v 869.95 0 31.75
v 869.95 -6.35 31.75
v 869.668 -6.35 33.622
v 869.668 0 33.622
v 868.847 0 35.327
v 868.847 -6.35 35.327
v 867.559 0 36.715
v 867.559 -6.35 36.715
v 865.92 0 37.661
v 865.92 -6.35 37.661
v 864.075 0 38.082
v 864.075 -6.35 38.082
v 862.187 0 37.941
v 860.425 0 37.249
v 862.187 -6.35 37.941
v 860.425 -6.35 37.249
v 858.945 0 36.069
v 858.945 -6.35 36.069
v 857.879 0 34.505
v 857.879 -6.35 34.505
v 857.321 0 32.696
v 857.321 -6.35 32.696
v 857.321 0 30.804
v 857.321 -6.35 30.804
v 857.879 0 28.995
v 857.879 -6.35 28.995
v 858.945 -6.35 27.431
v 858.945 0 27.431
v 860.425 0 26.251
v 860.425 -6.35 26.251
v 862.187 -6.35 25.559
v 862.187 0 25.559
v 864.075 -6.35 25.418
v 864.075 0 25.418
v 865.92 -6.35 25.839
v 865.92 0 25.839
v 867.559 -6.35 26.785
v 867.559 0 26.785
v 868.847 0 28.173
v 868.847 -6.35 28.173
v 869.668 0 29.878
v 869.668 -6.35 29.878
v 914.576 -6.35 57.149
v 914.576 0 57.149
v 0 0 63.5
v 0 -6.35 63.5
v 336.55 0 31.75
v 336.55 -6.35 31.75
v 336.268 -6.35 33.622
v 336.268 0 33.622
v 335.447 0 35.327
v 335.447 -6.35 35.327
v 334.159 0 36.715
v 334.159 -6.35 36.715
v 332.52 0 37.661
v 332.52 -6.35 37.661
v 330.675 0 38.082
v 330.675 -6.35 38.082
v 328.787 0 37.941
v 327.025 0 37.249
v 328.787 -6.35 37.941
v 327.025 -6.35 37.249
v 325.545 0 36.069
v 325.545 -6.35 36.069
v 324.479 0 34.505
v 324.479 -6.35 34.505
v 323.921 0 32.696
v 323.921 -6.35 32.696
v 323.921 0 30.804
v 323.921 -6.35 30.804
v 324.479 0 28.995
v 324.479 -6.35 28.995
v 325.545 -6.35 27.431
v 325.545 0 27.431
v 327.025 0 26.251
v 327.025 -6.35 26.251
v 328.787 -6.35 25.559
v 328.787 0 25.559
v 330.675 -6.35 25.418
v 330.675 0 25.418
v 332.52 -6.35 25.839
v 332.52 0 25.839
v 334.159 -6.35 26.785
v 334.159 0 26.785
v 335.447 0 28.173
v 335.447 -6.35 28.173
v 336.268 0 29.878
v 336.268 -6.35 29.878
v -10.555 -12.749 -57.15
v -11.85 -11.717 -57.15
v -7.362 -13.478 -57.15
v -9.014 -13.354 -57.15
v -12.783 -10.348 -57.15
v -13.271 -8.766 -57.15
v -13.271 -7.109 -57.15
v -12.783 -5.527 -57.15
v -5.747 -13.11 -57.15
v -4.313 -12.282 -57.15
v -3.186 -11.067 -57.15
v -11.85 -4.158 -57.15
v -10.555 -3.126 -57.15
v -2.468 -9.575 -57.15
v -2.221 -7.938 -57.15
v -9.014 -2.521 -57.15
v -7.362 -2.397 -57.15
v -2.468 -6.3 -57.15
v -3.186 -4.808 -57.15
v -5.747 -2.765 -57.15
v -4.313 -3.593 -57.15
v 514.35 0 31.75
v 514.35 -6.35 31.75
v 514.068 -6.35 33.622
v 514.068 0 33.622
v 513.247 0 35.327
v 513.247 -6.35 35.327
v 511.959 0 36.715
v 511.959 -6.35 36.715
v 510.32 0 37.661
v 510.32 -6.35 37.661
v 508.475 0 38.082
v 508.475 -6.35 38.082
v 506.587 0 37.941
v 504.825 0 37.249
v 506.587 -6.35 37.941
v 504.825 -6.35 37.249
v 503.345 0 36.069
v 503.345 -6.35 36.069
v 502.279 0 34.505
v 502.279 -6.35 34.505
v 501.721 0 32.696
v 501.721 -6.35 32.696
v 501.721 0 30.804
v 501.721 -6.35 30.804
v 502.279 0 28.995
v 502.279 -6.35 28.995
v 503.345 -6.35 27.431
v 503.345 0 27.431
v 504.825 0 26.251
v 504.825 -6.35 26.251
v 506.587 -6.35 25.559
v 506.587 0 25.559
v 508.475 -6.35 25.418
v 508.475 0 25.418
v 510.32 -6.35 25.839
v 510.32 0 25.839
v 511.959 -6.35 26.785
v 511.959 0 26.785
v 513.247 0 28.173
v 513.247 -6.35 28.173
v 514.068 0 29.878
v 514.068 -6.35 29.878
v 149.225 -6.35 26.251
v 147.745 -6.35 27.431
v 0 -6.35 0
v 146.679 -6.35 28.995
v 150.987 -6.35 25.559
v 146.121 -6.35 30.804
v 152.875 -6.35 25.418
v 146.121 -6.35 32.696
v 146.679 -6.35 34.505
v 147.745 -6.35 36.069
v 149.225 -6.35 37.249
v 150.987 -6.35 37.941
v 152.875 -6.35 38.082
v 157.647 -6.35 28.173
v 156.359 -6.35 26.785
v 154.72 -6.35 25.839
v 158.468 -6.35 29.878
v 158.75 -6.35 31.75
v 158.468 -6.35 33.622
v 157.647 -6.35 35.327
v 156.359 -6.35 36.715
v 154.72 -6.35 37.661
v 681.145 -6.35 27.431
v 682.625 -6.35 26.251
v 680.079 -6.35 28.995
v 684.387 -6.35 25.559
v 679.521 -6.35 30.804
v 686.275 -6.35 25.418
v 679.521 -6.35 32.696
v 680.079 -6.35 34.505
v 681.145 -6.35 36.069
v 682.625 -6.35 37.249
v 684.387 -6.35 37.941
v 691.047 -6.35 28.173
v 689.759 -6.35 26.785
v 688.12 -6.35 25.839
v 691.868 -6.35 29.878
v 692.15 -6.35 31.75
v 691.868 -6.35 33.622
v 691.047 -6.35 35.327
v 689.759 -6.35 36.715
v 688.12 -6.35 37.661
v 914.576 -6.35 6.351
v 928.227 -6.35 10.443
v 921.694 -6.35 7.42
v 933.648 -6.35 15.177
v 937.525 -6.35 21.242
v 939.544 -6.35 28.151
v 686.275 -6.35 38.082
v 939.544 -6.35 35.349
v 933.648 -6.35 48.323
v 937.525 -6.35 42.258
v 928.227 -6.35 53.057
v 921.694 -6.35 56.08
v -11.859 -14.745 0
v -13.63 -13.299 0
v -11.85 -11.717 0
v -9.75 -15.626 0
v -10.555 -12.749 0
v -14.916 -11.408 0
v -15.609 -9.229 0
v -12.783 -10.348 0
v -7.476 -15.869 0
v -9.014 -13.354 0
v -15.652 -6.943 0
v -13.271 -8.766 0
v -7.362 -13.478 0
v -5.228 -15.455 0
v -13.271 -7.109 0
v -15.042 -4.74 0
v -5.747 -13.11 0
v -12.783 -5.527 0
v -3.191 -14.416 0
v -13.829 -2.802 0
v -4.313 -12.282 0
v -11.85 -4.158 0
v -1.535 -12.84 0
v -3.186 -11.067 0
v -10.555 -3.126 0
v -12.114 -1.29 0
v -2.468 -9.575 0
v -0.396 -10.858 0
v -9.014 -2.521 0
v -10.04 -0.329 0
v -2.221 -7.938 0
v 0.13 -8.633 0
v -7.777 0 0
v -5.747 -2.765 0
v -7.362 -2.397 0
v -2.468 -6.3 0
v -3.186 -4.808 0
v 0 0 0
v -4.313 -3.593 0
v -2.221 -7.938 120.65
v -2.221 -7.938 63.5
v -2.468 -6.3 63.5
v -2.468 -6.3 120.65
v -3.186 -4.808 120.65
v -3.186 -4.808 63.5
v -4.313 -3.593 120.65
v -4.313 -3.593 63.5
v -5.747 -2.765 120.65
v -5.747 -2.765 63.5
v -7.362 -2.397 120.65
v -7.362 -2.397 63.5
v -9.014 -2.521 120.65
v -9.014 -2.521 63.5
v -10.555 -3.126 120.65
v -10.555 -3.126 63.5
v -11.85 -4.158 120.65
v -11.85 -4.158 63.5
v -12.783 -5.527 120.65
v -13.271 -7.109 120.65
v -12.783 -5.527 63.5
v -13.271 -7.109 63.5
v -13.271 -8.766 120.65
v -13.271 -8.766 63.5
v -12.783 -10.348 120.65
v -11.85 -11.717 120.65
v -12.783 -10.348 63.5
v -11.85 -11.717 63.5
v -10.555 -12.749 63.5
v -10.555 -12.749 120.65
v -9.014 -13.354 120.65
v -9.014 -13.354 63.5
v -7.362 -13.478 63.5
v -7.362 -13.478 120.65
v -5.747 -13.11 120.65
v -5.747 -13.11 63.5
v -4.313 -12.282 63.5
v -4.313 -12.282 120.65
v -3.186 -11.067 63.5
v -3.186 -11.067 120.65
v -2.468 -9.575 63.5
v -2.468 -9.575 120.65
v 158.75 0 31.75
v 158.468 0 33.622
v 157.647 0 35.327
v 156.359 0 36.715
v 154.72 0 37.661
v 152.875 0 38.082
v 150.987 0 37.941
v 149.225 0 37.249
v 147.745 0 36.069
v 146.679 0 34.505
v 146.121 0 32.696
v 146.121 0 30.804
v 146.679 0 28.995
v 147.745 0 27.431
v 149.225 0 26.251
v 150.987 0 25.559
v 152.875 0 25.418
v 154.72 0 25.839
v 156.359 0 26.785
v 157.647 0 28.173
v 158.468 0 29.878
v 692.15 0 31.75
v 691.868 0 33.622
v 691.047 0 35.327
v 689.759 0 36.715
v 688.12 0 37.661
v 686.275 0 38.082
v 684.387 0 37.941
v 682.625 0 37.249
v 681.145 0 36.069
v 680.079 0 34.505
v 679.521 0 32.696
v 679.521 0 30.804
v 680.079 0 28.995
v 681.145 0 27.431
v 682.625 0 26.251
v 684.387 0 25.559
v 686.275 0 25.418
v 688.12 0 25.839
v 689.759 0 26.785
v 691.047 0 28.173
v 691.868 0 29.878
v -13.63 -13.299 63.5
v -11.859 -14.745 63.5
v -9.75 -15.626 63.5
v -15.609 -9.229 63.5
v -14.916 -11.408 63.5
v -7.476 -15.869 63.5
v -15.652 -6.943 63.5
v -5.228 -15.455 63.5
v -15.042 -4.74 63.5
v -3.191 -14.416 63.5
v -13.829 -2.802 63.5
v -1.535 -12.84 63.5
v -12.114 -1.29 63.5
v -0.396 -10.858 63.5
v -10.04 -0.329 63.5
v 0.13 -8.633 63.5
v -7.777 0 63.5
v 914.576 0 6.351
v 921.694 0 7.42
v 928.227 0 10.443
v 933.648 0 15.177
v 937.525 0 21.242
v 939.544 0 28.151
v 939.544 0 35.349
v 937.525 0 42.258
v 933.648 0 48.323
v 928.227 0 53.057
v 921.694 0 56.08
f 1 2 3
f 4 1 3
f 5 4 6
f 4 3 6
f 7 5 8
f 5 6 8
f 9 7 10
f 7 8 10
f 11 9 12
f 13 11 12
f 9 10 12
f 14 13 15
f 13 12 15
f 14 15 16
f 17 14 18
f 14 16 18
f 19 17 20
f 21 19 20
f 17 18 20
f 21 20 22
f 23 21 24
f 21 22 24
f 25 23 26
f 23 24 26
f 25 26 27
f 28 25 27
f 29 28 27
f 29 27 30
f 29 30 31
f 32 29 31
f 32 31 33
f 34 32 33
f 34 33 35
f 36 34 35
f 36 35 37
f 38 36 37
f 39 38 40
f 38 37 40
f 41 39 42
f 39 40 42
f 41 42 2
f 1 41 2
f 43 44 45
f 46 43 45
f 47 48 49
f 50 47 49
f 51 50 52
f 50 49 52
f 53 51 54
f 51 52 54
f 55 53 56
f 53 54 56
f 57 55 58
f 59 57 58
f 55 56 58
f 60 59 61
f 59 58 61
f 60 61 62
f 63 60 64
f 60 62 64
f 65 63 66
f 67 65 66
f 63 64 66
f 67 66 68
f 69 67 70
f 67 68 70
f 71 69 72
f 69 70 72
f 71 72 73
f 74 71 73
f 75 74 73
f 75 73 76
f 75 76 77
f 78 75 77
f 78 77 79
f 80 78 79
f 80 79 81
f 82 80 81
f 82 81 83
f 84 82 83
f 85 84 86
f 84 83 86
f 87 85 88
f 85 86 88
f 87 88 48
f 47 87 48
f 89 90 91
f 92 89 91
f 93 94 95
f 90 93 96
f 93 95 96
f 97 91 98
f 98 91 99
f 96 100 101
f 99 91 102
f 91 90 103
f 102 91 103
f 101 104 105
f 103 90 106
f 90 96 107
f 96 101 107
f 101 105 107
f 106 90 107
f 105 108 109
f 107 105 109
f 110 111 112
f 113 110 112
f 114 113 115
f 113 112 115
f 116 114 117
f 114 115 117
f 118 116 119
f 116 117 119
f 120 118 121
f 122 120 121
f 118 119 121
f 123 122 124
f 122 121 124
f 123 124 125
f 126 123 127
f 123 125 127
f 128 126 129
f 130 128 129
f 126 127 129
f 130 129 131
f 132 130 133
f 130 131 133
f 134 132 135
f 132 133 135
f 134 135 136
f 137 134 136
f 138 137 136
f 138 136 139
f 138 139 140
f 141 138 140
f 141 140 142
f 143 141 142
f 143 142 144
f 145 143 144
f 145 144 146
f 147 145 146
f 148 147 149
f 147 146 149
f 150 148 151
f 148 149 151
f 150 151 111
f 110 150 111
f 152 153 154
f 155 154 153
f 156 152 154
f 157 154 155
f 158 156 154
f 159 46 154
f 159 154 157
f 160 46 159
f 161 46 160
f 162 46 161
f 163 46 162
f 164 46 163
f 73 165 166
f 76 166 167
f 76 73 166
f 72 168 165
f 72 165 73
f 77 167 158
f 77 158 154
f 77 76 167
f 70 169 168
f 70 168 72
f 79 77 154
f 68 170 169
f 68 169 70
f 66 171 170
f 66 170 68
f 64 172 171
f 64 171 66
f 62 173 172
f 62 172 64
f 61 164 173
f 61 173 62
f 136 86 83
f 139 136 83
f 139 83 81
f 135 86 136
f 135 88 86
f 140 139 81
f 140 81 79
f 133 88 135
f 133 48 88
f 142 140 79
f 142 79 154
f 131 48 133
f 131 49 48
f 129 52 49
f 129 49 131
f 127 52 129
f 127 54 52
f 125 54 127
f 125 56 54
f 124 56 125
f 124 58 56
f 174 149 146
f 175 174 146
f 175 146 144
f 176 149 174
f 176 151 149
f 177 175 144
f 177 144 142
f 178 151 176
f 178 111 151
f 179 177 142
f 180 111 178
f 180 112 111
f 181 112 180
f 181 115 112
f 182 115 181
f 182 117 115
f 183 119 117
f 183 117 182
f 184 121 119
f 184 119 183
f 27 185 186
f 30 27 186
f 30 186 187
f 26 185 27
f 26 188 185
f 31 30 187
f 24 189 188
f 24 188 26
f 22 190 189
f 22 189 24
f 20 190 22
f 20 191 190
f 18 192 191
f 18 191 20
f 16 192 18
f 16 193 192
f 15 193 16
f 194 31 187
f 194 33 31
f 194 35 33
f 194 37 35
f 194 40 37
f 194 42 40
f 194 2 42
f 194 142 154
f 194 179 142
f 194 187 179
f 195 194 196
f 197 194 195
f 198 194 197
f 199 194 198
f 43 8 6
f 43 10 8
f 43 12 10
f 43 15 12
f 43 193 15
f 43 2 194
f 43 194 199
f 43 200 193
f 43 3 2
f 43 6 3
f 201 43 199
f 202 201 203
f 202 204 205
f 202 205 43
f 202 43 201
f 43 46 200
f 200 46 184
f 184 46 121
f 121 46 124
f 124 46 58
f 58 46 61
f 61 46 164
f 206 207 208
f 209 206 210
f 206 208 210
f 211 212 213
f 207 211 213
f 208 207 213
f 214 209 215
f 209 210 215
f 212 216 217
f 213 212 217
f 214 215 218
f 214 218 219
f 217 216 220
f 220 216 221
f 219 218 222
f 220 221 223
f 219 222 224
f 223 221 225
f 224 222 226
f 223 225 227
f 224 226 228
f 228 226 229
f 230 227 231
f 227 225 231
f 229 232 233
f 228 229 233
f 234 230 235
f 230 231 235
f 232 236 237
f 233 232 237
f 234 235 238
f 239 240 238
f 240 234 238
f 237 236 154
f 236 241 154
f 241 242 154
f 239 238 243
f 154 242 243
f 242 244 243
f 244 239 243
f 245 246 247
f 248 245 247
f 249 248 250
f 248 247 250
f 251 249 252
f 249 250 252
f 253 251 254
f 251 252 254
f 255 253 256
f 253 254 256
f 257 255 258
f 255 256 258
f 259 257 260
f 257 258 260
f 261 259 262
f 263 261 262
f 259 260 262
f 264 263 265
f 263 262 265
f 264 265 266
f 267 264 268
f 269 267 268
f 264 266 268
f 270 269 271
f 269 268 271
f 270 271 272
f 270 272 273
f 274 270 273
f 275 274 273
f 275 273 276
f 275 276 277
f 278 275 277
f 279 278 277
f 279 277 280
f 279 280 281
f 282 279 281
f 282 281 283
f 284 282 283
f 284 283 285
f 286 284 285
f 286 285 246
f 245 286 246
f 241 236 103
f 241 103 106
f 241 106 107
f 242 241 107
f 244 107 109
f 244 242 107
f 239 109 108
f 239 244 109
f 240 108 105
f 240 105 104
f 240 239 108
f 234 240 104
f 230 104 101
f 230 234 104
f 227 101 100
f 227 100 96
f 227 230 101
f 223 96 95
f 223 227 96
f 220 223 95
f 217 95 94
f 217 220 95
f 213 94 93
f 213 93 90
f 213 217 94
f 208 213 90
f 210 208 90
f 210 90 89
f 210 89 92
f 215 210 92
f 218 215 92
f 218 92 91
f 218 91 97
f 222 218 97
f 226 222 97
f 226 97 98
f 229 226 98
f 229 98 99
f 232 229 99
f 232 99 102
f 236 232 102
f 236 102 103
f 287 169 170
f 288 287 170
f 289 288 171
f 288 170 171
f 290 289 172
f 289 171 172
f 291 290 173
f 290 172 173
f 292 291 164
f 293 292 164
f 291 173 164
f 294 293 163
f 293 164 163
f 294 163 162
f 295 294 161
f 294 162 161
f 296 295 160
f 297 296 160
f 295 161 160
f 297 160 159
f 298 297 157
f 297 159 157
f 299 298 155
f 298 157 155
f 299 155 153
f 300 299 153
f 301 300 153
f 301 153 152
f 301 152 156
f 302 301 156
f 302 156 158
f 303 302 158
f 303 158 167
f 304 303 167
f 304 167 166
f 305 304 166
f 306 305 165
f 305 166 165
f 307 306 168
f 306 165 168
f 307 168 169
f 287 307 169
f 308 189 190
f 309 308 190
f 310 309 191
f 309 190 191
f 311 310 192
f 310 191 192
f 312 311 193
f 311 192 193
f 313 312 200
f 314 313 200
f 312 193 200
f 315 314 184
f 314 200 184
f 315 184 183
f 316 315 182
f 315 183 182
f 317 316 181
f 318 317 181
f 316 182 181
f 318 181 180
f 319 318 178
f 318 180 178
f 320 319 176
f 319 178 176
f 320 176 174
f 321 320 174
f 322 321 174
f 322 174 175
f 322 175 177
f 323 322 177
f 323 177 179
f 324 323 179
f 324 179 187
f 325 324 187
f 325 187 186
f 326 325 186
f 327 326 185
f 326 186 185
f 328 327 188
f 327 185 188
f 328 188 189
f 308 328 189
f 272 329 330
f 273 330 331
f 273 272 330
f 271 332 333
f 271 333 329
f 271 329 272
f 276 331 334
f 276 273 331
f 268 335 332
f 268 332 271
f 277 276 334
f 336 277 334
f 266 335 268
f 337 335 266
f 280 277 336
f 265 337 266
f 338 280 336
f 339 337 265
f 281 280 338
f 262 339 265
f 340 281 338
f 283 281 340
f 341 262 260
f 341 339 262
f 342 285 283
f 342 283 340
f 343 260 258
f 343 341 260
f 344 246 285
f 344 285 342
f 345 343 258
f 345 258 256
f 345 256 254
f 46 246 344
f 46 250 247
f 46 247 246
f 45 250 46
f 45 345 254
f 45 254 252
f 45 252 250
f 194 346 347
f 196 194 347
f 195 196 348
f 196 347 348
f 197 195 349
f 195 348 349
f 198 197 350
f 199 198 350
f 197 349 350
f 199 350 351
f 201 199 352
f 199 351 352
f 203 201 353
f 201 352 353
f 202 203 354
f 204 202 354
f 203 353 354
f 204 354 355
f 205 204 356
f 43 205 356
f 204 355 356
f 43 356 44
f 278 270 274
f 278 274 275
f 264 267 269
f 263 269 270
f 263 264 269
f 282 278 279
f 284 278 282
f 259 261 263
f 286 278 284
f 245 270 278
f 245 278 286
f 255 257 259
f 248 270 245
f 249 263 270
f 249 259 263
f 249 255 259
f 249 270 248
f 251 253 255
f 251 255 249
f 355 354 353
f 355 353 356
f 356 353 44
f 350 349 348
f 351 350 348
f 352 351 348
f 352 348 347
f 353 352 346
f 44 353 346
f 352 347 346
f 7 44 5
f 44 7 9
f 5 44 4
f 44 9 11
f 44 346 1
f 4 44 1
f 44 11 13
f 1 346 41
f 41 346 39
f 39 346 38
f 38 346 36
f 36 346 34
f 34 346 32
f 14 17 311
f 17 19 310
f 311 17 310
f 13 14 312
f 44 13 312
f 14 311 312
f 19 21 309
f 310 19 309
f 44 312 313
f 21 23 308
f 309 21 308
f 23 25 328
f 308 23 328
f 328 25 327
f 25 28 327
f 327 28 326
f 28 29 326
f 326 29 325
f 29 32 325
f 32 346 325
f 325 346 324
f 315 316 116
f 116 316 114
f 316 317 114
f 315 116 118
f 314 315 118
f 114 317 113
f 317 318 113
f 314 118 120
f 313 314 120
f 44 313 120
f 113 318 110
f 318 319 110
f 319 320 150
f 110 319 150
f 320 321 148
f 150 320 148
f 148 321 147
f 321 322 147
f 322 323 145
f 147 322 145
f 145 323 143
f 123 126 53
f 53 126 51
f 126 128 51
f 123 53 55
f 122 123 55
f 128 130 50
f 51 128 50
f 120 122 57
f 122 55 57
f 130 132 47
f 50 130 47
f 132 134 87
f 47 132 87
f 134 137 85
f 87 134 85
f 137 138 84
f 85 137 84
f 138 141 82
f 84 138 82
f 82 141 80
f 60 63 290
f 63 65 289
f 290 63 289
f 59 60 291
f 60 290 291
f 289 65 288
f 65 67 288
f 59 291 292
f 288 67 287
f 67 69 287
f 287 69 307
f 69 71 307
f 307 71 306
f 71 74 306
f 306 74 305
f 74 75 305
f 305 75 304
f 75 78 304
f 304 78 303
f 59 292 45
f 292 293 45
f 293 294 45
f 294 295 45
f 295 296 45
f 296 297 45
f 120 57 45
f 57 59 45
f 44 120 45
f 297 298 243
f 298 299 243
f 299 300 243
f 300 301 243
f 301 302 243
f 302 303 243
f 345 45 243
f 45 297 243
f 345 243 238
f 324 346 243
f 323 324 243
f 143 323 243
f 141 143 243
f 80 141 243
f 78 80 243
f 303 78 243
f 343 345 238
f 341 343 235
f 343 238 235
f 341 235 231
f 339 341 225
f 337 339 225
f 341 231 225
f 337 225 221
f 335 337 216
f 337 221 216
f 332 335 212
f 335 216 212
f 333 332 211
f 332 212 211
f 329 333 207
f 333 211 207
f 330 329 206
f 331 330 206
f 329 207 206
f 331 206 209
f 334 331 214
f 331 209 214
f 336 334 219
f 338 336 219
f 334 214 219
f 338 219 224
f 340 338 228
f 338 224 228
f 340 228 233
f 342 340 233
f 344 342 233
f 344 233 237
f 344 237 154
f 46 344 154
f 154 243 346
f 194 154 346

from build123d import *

# Parameters (mm, degrees)
F1_DEPTH      = 6.35
F3_DEPTH      = 63.5
F5_R          = 5.55625
F6_DEPTH      = 88.9
F6_DEPTH_BACK = 88.9
F7_R          = 6.35
F8_DEPTH      = 6.35


with BuildPart() as f1:
    # F0 (on Front) → F1 (new body)
    with BuildSketch(Plane.XZ):
        with BuildLine():
            Line((914.5763676277, 57.1493876788), (0, 63.5))
            Line((0, 63.5), (0, 0))
            Line((0, 0), (914.5763676277, 6.3506123212))
            ThreePointArc((914.5763676277, 6.3506123212), (939.8, 31.75), (914.5763676277, 57.1493876788))
        make_face()
    extrude(amount=F1_DEPTH)

    # F2 (on Top) → F3 (join)
    with BuildSketch(Plane.XY):
        with BuildLine():
            Line((0, 0), (-7.7771299333, 0))
            ThreePointArc((-7.7771299333, 0), (-12.7972457189, -14.0858610621), (0, -6.35))
            Line((0, -6.35), (0, 0))
        make_face()
    extrude(amount=F3_DEPTH)

    # F5 (on mid) → F6 (join, two sides)
    with BuildSketch(Plane.XY.offset(31.75)) as f6_sk:
        with Locations((-7.7771299333, -7.9375)):
            Circle(F5_R)
    extrude(amount=F6_DEPTH)
    extrude(f6_sk.sketch, amount=-F6_DEPTH_BACK)

    # F7 (on face) → F8 (cut, through all)
    with BuildSketch(Plane.XZ.offset(6.35)):
        with Locations((152.4, 31.75)):
            Circle(F7_R)
        with Locations((330.2, 31.75)):
            Circle(F7_R)
        with Locations((508, 31.75)):
            Circle(F7_R)
        with Locations((685.8, 31.75)):
            Circle(F7_R)
        with Locations((863.6, 31.75)):
            Circle(F7_R)
    extrude(amount=-F8_DEPTH, mode=Mode.SUBTRACT)


solid = f1.part
